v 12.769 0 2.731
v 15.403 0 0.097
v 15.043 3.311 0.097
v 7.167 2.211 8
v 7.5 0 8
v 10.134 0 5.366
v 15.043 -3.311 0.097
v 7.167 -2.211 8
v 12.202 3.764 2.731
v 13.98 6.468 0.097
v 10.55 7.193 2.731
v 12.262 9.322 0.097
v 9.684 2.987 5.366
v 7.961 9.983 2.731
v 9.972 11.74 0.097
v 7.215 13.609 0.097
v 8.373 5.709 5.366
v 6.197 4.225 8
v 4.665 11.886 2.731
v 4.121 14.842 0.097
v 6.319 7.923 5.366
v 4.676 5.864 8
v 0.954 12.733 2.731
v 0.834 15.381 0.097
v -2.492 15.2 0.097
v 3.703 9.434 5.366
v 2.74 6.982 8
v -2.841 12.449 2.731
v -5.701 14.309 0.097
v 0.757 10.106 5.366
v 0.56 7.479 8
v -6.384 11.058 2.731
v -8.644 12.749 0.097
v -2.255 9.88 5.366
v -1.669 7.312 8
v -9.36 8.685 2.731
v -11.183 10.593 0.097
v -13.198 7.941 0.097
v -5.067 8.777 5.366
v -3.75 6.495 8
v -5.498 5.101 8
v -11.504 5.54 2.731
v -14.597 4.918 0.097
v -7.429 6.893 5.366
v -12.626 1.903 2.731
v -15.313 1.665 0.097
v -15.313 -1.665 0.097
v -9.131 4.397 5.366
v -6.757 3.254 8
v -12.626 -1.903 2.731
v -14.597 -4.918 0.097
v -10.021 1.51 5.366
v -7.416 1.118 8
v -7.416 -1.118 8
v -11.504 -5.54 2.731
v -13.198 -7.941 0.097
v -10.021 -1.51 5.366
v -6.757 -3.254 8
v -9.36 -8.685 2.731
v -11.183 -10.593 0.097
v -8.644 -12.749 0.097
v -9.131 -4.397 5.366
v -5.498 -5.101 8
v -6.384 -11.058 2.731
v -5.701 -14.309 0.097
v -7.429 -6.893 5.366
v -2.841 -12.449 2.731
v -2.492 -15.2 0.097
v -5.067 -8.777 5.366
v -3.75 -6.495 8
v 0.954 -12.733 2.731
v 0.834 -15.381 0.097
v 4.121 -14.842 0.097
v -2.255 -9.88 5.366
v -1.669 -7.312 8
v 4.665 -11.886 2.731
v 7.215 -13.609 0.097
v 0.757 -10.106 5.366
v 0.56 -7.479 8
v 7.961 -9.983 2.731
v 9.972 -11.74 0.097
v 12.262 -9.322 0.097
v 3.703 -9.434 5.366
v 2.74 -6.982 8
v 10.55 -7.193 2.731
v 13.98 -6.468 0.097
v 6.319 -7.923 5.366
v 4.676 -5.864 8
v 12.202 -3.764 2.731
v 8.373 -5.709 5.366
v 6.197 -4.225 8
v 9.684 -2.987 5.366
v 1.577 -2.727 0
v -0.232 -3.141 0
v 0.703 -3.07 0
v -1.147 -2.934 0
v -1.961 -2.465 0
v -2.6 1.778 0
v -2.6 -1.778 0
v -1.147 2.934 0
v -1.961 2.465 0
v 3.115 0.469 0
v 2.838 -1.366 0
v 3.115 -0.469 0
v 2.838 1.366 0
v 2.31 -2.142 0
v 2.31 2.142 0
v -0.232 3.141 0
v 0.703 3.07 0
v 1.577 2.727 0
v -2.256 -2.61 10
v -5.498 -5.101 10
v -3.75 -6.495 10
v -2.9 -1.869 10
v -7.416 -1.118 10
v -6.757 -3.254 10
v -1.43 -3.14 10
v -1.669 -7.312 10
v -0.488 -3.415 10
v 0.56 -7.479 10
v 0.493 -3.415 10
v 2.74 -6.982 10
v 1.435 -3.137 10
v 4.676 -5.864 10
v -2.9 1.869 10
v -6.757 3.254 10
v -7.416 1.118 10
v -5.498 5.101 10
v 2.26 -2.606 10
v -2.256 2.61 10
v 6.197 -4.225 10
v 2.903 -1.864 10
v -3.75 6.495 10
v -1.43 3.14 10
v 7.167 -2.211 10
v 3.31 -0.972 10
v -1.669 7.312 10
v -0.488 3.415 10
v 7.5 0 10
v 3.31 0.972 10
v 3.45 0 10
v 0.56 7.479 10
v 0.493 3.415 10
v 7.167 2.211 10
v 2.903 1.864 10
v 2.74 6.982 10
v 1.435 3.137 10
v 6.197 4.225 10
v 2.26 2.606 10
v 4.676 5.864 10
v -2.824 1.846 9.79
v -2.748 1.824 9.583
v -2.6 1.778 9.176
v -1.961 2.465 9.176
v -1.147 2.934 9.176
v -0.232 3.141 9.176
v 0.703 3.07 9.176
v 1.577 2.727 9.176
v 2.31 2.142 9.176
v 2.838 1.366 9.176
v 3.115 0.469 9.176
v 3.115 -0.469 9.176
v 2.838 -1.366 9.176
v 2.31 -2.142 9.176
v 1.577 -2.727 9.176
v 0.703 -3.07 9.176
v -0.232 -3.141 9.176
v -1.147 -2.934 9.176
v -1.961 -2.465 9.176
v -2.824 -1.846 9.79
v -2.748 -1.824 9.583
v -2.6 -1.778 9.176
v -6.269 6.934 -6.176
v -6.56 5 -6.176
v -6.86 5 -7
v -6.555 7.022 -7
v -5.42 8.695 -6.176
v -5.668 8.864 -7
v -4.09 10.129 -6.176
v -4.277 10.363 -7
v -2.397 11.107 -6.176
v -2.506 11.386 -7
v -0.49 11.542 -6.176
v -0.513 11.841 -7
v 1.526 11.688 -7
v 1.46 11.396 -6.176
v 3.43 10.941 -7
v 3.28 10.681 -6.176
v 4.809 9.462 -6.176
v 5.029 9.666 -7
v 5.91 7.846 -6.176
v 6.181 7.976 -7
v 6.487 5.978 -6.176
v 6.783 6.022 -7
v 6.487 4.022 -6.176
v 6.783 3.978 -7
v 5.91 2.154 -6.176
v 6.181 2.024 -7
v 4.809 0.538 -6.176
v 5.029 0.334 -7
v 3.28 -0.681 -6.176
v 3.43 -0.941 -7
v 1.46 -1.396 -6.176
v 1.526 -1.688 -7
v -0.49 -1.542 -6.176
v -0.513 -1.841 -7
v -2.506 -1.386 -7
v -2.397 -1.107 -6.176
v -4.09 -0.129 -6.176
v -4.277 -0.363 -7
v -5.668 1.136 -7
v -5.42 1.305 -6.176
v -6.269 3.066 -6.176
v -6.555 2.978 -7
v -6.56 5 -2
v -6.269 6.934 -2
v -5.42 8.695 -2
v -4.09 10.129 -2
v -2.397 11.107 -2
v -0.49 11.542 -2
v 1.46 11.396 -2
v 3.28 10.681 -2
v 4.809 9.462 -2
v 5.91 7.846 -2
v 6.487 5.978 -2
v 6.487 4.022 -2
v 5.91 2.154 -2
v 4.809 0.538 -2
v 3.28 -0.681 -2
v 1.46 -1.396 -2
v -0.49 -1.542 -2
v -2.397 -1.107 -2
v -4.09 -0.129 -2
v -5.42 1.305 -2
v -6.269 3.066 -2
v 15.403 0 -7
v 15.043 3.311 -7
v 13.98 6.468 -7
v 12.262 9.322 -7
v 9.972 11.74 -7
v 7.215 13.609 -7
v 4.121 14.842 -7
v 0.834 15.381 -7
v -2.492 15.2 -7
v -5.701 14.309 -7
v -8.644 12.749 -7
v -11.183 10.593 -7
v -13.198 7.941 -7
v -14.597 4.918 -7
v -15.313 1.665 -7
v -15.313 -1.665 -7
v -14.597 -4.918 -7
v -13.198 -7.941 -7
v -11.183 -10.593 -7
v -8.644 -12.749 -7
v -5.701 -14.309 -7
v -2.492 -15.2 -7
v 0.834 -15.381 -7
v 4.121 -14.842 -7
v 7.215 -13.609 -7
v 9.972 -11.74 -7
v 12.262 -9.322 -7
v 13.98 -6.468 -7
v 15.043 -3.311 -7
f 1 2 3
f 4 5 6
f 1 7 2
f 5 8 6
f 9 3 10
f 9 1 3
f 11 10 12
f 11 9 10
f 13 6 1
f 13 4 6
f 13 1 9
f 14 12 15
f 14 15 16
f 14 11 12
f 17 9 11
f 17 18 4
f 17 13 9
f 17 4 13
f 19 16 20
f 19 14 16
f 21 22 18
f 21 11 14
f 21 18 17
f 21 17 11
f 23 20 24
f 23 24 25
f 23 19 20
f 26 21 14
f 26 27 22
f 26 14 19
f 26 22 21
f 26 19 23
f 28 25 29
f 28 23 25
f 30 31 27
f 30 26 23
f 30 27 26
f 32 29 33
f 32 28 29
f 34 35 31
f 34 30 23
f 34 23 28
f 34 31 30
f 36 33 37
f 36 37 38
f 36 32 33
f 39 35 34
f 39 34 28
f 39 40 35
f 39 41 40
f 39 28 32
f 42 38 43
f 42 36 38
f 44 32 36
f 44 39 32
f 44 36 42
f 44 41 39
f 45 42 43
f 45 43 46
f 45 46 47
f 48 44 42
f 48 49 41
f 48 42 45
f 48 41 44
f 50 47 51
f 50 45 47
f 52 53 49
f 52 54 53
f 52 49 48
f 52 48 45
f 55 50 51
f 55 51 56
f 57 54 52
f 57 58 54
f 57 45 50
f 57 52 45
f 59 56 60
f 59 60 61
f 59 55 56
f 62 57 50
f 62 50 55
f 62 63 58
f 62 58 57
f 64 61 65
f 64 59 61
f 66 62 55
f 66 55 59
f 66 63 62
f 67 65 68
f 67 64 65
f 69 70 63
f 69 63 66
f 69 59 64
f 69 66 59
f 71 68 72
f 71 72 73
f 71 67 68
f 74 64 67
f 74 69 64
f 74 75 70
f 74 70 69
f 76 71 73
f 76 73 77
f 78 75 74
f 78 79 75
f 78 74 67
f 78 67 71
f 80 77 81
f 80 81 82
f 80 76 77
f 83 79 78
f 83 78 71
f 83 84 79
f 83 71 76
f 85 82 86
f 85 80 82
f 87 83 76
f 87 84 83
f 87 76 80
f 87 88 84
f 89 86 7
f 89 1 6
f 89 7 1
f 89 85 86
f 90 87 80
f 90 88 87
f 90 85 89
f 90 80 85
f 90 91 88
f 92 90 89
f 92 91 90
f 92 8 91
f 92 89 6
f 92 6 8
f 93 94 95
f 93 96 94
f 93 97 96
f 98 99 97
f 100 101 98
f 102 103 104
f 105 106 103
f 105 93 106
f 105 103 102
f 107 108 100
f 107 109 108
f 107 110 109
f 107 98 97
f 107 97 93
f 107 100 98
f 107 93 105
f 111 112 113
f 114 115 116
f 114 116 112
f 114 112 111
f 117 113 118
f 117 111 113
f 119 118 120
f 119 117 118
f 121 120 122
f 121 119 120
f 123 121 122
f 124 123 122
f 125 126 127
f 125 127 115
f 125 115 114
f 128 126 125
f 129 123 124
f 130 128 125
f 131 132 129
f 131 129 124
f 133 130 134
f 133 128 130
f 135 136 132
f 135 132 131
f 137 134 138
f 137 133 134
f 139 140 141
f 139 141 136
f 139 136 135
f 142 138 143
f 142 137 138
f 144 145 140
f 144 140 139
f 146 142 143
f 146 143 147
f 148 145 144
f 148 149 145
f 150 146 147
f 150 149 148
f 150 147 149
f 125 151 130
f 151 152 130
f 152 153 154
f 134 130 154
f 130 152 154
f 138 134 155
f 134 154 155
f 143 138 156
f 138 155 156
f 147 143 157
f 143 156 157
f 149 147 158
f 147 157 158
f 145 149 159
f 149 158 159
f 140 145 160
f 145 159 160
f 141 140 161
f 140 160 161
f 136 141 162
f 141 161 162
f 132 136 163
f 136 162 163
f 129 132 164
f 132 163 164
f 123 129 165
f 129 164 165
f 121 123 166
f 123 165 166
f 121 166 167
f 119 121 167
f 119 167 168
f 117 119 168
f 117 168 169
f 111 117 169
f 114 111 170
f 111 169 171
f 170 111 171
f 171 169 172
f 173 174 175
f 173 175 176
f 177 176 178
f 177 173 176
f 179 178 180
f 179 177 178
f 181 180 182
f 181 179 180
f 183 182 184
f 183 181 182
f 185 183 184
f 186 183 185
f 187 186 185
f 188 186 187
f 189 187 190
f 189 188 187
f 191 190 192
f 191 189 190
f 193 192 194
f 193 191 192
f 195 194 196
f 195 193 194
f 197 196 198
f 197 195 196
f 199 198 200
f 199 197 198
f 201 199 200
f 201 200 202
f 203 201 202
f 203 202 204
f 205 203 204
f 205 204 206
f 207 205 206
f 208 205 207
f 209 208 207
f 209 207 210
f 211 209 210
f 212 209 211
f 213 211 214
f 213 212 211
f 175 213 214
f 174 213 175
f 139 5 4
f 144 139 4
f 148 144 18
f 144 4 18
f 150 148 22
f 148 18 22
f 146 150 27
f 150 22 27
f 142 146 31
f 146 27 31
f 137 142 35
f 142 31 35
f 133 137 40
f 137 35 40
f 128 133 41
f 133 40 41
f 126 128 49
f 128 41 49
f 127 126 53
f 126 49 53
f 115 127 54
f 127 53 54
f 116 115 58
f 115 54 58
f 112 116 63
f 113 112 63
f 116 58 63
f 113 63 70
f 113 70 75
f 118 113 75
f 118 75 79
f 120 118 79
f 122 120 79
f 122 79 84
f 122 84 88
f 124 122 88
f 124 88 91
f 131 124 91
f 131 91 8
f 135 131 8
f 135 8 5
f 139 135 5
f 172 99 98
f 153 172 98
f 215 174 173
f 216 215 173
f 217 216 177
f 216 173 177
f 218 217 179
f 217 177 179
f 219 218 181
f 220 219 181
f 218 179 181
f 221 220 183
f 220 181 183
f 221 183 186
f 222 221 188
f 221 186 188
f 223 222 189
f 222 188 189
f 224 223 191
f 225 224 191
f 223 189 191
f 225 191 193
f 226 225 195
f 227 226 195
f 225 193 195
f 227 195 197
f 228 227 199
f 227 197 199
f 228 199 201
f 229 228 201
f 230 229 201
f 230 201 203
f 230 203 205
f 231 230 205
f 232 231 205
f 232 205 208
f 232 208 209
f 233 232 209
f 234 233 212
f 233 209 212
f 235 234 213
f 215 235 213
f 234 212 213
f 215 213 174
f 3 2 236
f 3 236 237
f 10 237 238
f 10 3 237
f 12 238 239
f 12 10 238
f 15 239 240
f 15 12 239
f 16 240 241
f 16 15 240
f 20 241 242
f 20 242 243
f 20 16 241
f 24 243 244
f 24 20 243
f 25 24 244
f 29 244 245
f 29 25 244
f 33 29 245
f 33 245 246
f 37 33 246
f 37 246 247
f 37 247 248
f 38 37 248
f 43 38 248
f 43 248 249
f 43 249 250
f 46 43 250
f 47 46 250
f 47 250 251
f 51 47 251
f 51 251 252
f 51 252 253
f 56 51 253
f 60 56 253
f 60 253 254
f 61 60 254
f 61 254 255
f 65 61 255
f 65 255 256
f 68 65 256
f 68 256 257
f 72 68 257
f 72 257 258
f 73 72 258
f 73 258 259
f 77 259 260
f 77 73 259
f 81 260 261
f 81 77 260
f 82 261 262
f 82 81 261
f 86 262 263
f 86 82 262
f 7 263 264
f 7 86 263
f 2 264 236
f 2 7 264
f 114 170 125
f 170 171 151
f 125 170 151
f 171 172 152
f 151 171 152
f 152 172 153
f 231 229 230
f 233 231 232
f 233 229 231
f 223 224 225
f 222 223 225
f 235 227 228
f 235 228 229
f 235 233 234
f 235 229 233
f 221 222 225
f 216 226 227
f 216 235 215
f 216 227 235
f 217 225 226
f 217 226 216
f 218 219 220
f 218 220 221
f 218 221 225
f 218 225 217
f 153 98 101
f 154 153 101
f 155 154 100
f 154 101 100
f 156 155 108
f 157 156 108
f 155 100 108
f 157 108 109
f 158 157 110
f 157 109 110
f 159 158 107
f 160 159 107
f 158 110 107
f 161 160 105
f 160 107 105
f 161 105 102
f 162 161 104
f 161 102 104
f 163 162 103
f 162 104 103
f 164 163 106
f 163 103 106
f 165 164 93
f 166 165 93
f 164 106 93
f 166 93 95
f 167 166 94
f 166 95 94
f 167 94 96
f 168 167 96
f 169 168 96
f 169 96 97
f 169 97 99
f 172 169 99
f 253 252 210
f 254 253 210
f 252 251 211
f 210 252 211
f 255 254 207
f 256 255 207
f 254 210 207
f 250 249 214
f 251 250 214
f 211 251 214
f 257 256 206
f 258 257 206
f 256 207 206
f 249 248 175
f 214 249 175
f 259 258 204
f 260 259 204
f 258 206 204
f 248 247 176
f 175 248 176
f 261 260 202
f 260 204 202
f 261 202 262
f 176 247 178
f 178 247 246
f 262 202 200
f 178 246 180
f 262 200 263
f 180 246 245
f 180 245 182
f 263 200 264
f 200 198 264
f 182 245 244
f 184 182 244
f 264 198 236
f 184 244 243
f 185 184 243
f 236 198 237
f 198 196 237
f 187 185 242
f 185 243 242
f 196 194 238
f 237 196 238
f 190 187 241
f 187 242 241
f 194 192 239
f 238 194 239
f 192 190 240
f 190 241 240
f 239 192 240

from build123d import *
from OCP.BRepFilletAPI import BRepFilletAPI_MakeChamfer

# Parameters (mm, degrees)
SKETCH1_R           = 7.5
BOSS_EXTRUDE1_DEPTH = 10
SKETCH2_R           = 15.403290795
BOSS_EXTRUDE2_DEPTH = 7
SKETCH4_R           = 6.56
CUT_EXTRUDE1_DEPTH  = 5
CHAMFER1_SIZE       = 8
CHAMFER2_SIZE       = 0.3
CHAMFER2_SIZE2      = 0.824243226


with BuildPart() as part:
    # Sketch1 → Boss-Extrude1 (new body)
    with BuildSketch(Plane.XY):
        Circle(SKETCH1_R)
        with BuildLine():
            Line((-2.6, -1.778341924), (-2.6, 1.778341924))
            ThreePointArc((-2.6, 1.778341924), (3.15, 0), (-2.6, -1.778341924))
        make_face(mode=Mode.SUBTRACT)
    extrude(amount=BOSS_EXTRUDE1_DEPTH)

    # Sketch2 → Boss-Extrude2 (add)
    with BuildSketch(Plane.XY):
        Circle(SKETCH2_R)
    extrude(amount=-BOSS_EXTRUDE2_DEPTH)

    # Sketch4 → Cut-Extrude1 (cut)
    with BuildSketch(Plane(origin=(0, 0, -7), x_dir=(-1, 0, 0), z_dir=(0, 0, -1))):
        with Locations((0, 5)):
            Circle(SKETCH4_R)
    extrude(amount=-CUT_EXTRUDE1_DEPTH, mode=Mode.SUBTRACT)

    # Chamfer1
    # the kernel refuses this chamfer: 8 mm, written as the material it adds along each edge
    with BuildSketch(Plane(origin=(0, 0, 0), x_dir=(1, 0, 0), z_dir=(0, -1, 0))) as chamfer1_piece_1_section:
        Polygon((7.5 + CHAMFER1_SIZE, 0), (7.5, CHAMFER1_SIZE), (7.5, 0), align=None)
    chamfer1_piece_1 = revolve(axis=Axis((0, 0, 0), (0, 0, 1)), mode=Mode.PRIVATE)
    chamfer1_piece_1 = chamfer1_piece_1 & Plane(origin=(0, 0, 4.06906202), x_dir=(1, 0, 0), z_dir=(0, 0, 1)) * Cylinder(15.403290795, 62, mode=Mode.PRIVATE)
    add(chamfer1_piece_1)

    # Chamfer2: one chamfer whose edges measure the first distance from different faces: ONE call of the kernel's chamfer builder (chamfer() names one face for all edges)
    chamfer2_edges_1 = [part.edges().sort_by_distance(p)[0] for p in [
        (6.56, 5, -7),
    ]]
    chamfer2_side_1 = [part.faces().sort_by_distance(p)[0] for p in [
        (-14.96761994, 0, -7),
    ]]
    chamfer2_edges_2 = [part.edges().sort_by_distance(p)[0] for p in [
        (3.15, 0, 10),
        (-2.6, 0, 10),
    ]]
    chamfer2_side_2 = [part.faces().sort_by_distance(p)[0] for p in [
        (-7.287867966, 0, 10),
    ]]
    chamfer2 = BRepFilletAPI_MakeChamfer(part.part.solid().wrapped)
    for e in chamfer2_edges_1:
        chamfer2.Add(CHAMFER2_SIZE, CHAMFER2_SIZE2, e.wrapped, chamfer2_side_1[0].wrapped)  # the first distance lies on this face
    for e in chamfer2_edges_2:
        chamfer2.Add(CHAMFER2_SIZE, CHAMFER2_SIZE2, e.wrapped, chamfer2_side_2[0].wrapped)  # the first distance lies on this face
    add(Compound.cast(chamfer2.Shape()), mode=Mode.REPLACE)


solid = part.part
